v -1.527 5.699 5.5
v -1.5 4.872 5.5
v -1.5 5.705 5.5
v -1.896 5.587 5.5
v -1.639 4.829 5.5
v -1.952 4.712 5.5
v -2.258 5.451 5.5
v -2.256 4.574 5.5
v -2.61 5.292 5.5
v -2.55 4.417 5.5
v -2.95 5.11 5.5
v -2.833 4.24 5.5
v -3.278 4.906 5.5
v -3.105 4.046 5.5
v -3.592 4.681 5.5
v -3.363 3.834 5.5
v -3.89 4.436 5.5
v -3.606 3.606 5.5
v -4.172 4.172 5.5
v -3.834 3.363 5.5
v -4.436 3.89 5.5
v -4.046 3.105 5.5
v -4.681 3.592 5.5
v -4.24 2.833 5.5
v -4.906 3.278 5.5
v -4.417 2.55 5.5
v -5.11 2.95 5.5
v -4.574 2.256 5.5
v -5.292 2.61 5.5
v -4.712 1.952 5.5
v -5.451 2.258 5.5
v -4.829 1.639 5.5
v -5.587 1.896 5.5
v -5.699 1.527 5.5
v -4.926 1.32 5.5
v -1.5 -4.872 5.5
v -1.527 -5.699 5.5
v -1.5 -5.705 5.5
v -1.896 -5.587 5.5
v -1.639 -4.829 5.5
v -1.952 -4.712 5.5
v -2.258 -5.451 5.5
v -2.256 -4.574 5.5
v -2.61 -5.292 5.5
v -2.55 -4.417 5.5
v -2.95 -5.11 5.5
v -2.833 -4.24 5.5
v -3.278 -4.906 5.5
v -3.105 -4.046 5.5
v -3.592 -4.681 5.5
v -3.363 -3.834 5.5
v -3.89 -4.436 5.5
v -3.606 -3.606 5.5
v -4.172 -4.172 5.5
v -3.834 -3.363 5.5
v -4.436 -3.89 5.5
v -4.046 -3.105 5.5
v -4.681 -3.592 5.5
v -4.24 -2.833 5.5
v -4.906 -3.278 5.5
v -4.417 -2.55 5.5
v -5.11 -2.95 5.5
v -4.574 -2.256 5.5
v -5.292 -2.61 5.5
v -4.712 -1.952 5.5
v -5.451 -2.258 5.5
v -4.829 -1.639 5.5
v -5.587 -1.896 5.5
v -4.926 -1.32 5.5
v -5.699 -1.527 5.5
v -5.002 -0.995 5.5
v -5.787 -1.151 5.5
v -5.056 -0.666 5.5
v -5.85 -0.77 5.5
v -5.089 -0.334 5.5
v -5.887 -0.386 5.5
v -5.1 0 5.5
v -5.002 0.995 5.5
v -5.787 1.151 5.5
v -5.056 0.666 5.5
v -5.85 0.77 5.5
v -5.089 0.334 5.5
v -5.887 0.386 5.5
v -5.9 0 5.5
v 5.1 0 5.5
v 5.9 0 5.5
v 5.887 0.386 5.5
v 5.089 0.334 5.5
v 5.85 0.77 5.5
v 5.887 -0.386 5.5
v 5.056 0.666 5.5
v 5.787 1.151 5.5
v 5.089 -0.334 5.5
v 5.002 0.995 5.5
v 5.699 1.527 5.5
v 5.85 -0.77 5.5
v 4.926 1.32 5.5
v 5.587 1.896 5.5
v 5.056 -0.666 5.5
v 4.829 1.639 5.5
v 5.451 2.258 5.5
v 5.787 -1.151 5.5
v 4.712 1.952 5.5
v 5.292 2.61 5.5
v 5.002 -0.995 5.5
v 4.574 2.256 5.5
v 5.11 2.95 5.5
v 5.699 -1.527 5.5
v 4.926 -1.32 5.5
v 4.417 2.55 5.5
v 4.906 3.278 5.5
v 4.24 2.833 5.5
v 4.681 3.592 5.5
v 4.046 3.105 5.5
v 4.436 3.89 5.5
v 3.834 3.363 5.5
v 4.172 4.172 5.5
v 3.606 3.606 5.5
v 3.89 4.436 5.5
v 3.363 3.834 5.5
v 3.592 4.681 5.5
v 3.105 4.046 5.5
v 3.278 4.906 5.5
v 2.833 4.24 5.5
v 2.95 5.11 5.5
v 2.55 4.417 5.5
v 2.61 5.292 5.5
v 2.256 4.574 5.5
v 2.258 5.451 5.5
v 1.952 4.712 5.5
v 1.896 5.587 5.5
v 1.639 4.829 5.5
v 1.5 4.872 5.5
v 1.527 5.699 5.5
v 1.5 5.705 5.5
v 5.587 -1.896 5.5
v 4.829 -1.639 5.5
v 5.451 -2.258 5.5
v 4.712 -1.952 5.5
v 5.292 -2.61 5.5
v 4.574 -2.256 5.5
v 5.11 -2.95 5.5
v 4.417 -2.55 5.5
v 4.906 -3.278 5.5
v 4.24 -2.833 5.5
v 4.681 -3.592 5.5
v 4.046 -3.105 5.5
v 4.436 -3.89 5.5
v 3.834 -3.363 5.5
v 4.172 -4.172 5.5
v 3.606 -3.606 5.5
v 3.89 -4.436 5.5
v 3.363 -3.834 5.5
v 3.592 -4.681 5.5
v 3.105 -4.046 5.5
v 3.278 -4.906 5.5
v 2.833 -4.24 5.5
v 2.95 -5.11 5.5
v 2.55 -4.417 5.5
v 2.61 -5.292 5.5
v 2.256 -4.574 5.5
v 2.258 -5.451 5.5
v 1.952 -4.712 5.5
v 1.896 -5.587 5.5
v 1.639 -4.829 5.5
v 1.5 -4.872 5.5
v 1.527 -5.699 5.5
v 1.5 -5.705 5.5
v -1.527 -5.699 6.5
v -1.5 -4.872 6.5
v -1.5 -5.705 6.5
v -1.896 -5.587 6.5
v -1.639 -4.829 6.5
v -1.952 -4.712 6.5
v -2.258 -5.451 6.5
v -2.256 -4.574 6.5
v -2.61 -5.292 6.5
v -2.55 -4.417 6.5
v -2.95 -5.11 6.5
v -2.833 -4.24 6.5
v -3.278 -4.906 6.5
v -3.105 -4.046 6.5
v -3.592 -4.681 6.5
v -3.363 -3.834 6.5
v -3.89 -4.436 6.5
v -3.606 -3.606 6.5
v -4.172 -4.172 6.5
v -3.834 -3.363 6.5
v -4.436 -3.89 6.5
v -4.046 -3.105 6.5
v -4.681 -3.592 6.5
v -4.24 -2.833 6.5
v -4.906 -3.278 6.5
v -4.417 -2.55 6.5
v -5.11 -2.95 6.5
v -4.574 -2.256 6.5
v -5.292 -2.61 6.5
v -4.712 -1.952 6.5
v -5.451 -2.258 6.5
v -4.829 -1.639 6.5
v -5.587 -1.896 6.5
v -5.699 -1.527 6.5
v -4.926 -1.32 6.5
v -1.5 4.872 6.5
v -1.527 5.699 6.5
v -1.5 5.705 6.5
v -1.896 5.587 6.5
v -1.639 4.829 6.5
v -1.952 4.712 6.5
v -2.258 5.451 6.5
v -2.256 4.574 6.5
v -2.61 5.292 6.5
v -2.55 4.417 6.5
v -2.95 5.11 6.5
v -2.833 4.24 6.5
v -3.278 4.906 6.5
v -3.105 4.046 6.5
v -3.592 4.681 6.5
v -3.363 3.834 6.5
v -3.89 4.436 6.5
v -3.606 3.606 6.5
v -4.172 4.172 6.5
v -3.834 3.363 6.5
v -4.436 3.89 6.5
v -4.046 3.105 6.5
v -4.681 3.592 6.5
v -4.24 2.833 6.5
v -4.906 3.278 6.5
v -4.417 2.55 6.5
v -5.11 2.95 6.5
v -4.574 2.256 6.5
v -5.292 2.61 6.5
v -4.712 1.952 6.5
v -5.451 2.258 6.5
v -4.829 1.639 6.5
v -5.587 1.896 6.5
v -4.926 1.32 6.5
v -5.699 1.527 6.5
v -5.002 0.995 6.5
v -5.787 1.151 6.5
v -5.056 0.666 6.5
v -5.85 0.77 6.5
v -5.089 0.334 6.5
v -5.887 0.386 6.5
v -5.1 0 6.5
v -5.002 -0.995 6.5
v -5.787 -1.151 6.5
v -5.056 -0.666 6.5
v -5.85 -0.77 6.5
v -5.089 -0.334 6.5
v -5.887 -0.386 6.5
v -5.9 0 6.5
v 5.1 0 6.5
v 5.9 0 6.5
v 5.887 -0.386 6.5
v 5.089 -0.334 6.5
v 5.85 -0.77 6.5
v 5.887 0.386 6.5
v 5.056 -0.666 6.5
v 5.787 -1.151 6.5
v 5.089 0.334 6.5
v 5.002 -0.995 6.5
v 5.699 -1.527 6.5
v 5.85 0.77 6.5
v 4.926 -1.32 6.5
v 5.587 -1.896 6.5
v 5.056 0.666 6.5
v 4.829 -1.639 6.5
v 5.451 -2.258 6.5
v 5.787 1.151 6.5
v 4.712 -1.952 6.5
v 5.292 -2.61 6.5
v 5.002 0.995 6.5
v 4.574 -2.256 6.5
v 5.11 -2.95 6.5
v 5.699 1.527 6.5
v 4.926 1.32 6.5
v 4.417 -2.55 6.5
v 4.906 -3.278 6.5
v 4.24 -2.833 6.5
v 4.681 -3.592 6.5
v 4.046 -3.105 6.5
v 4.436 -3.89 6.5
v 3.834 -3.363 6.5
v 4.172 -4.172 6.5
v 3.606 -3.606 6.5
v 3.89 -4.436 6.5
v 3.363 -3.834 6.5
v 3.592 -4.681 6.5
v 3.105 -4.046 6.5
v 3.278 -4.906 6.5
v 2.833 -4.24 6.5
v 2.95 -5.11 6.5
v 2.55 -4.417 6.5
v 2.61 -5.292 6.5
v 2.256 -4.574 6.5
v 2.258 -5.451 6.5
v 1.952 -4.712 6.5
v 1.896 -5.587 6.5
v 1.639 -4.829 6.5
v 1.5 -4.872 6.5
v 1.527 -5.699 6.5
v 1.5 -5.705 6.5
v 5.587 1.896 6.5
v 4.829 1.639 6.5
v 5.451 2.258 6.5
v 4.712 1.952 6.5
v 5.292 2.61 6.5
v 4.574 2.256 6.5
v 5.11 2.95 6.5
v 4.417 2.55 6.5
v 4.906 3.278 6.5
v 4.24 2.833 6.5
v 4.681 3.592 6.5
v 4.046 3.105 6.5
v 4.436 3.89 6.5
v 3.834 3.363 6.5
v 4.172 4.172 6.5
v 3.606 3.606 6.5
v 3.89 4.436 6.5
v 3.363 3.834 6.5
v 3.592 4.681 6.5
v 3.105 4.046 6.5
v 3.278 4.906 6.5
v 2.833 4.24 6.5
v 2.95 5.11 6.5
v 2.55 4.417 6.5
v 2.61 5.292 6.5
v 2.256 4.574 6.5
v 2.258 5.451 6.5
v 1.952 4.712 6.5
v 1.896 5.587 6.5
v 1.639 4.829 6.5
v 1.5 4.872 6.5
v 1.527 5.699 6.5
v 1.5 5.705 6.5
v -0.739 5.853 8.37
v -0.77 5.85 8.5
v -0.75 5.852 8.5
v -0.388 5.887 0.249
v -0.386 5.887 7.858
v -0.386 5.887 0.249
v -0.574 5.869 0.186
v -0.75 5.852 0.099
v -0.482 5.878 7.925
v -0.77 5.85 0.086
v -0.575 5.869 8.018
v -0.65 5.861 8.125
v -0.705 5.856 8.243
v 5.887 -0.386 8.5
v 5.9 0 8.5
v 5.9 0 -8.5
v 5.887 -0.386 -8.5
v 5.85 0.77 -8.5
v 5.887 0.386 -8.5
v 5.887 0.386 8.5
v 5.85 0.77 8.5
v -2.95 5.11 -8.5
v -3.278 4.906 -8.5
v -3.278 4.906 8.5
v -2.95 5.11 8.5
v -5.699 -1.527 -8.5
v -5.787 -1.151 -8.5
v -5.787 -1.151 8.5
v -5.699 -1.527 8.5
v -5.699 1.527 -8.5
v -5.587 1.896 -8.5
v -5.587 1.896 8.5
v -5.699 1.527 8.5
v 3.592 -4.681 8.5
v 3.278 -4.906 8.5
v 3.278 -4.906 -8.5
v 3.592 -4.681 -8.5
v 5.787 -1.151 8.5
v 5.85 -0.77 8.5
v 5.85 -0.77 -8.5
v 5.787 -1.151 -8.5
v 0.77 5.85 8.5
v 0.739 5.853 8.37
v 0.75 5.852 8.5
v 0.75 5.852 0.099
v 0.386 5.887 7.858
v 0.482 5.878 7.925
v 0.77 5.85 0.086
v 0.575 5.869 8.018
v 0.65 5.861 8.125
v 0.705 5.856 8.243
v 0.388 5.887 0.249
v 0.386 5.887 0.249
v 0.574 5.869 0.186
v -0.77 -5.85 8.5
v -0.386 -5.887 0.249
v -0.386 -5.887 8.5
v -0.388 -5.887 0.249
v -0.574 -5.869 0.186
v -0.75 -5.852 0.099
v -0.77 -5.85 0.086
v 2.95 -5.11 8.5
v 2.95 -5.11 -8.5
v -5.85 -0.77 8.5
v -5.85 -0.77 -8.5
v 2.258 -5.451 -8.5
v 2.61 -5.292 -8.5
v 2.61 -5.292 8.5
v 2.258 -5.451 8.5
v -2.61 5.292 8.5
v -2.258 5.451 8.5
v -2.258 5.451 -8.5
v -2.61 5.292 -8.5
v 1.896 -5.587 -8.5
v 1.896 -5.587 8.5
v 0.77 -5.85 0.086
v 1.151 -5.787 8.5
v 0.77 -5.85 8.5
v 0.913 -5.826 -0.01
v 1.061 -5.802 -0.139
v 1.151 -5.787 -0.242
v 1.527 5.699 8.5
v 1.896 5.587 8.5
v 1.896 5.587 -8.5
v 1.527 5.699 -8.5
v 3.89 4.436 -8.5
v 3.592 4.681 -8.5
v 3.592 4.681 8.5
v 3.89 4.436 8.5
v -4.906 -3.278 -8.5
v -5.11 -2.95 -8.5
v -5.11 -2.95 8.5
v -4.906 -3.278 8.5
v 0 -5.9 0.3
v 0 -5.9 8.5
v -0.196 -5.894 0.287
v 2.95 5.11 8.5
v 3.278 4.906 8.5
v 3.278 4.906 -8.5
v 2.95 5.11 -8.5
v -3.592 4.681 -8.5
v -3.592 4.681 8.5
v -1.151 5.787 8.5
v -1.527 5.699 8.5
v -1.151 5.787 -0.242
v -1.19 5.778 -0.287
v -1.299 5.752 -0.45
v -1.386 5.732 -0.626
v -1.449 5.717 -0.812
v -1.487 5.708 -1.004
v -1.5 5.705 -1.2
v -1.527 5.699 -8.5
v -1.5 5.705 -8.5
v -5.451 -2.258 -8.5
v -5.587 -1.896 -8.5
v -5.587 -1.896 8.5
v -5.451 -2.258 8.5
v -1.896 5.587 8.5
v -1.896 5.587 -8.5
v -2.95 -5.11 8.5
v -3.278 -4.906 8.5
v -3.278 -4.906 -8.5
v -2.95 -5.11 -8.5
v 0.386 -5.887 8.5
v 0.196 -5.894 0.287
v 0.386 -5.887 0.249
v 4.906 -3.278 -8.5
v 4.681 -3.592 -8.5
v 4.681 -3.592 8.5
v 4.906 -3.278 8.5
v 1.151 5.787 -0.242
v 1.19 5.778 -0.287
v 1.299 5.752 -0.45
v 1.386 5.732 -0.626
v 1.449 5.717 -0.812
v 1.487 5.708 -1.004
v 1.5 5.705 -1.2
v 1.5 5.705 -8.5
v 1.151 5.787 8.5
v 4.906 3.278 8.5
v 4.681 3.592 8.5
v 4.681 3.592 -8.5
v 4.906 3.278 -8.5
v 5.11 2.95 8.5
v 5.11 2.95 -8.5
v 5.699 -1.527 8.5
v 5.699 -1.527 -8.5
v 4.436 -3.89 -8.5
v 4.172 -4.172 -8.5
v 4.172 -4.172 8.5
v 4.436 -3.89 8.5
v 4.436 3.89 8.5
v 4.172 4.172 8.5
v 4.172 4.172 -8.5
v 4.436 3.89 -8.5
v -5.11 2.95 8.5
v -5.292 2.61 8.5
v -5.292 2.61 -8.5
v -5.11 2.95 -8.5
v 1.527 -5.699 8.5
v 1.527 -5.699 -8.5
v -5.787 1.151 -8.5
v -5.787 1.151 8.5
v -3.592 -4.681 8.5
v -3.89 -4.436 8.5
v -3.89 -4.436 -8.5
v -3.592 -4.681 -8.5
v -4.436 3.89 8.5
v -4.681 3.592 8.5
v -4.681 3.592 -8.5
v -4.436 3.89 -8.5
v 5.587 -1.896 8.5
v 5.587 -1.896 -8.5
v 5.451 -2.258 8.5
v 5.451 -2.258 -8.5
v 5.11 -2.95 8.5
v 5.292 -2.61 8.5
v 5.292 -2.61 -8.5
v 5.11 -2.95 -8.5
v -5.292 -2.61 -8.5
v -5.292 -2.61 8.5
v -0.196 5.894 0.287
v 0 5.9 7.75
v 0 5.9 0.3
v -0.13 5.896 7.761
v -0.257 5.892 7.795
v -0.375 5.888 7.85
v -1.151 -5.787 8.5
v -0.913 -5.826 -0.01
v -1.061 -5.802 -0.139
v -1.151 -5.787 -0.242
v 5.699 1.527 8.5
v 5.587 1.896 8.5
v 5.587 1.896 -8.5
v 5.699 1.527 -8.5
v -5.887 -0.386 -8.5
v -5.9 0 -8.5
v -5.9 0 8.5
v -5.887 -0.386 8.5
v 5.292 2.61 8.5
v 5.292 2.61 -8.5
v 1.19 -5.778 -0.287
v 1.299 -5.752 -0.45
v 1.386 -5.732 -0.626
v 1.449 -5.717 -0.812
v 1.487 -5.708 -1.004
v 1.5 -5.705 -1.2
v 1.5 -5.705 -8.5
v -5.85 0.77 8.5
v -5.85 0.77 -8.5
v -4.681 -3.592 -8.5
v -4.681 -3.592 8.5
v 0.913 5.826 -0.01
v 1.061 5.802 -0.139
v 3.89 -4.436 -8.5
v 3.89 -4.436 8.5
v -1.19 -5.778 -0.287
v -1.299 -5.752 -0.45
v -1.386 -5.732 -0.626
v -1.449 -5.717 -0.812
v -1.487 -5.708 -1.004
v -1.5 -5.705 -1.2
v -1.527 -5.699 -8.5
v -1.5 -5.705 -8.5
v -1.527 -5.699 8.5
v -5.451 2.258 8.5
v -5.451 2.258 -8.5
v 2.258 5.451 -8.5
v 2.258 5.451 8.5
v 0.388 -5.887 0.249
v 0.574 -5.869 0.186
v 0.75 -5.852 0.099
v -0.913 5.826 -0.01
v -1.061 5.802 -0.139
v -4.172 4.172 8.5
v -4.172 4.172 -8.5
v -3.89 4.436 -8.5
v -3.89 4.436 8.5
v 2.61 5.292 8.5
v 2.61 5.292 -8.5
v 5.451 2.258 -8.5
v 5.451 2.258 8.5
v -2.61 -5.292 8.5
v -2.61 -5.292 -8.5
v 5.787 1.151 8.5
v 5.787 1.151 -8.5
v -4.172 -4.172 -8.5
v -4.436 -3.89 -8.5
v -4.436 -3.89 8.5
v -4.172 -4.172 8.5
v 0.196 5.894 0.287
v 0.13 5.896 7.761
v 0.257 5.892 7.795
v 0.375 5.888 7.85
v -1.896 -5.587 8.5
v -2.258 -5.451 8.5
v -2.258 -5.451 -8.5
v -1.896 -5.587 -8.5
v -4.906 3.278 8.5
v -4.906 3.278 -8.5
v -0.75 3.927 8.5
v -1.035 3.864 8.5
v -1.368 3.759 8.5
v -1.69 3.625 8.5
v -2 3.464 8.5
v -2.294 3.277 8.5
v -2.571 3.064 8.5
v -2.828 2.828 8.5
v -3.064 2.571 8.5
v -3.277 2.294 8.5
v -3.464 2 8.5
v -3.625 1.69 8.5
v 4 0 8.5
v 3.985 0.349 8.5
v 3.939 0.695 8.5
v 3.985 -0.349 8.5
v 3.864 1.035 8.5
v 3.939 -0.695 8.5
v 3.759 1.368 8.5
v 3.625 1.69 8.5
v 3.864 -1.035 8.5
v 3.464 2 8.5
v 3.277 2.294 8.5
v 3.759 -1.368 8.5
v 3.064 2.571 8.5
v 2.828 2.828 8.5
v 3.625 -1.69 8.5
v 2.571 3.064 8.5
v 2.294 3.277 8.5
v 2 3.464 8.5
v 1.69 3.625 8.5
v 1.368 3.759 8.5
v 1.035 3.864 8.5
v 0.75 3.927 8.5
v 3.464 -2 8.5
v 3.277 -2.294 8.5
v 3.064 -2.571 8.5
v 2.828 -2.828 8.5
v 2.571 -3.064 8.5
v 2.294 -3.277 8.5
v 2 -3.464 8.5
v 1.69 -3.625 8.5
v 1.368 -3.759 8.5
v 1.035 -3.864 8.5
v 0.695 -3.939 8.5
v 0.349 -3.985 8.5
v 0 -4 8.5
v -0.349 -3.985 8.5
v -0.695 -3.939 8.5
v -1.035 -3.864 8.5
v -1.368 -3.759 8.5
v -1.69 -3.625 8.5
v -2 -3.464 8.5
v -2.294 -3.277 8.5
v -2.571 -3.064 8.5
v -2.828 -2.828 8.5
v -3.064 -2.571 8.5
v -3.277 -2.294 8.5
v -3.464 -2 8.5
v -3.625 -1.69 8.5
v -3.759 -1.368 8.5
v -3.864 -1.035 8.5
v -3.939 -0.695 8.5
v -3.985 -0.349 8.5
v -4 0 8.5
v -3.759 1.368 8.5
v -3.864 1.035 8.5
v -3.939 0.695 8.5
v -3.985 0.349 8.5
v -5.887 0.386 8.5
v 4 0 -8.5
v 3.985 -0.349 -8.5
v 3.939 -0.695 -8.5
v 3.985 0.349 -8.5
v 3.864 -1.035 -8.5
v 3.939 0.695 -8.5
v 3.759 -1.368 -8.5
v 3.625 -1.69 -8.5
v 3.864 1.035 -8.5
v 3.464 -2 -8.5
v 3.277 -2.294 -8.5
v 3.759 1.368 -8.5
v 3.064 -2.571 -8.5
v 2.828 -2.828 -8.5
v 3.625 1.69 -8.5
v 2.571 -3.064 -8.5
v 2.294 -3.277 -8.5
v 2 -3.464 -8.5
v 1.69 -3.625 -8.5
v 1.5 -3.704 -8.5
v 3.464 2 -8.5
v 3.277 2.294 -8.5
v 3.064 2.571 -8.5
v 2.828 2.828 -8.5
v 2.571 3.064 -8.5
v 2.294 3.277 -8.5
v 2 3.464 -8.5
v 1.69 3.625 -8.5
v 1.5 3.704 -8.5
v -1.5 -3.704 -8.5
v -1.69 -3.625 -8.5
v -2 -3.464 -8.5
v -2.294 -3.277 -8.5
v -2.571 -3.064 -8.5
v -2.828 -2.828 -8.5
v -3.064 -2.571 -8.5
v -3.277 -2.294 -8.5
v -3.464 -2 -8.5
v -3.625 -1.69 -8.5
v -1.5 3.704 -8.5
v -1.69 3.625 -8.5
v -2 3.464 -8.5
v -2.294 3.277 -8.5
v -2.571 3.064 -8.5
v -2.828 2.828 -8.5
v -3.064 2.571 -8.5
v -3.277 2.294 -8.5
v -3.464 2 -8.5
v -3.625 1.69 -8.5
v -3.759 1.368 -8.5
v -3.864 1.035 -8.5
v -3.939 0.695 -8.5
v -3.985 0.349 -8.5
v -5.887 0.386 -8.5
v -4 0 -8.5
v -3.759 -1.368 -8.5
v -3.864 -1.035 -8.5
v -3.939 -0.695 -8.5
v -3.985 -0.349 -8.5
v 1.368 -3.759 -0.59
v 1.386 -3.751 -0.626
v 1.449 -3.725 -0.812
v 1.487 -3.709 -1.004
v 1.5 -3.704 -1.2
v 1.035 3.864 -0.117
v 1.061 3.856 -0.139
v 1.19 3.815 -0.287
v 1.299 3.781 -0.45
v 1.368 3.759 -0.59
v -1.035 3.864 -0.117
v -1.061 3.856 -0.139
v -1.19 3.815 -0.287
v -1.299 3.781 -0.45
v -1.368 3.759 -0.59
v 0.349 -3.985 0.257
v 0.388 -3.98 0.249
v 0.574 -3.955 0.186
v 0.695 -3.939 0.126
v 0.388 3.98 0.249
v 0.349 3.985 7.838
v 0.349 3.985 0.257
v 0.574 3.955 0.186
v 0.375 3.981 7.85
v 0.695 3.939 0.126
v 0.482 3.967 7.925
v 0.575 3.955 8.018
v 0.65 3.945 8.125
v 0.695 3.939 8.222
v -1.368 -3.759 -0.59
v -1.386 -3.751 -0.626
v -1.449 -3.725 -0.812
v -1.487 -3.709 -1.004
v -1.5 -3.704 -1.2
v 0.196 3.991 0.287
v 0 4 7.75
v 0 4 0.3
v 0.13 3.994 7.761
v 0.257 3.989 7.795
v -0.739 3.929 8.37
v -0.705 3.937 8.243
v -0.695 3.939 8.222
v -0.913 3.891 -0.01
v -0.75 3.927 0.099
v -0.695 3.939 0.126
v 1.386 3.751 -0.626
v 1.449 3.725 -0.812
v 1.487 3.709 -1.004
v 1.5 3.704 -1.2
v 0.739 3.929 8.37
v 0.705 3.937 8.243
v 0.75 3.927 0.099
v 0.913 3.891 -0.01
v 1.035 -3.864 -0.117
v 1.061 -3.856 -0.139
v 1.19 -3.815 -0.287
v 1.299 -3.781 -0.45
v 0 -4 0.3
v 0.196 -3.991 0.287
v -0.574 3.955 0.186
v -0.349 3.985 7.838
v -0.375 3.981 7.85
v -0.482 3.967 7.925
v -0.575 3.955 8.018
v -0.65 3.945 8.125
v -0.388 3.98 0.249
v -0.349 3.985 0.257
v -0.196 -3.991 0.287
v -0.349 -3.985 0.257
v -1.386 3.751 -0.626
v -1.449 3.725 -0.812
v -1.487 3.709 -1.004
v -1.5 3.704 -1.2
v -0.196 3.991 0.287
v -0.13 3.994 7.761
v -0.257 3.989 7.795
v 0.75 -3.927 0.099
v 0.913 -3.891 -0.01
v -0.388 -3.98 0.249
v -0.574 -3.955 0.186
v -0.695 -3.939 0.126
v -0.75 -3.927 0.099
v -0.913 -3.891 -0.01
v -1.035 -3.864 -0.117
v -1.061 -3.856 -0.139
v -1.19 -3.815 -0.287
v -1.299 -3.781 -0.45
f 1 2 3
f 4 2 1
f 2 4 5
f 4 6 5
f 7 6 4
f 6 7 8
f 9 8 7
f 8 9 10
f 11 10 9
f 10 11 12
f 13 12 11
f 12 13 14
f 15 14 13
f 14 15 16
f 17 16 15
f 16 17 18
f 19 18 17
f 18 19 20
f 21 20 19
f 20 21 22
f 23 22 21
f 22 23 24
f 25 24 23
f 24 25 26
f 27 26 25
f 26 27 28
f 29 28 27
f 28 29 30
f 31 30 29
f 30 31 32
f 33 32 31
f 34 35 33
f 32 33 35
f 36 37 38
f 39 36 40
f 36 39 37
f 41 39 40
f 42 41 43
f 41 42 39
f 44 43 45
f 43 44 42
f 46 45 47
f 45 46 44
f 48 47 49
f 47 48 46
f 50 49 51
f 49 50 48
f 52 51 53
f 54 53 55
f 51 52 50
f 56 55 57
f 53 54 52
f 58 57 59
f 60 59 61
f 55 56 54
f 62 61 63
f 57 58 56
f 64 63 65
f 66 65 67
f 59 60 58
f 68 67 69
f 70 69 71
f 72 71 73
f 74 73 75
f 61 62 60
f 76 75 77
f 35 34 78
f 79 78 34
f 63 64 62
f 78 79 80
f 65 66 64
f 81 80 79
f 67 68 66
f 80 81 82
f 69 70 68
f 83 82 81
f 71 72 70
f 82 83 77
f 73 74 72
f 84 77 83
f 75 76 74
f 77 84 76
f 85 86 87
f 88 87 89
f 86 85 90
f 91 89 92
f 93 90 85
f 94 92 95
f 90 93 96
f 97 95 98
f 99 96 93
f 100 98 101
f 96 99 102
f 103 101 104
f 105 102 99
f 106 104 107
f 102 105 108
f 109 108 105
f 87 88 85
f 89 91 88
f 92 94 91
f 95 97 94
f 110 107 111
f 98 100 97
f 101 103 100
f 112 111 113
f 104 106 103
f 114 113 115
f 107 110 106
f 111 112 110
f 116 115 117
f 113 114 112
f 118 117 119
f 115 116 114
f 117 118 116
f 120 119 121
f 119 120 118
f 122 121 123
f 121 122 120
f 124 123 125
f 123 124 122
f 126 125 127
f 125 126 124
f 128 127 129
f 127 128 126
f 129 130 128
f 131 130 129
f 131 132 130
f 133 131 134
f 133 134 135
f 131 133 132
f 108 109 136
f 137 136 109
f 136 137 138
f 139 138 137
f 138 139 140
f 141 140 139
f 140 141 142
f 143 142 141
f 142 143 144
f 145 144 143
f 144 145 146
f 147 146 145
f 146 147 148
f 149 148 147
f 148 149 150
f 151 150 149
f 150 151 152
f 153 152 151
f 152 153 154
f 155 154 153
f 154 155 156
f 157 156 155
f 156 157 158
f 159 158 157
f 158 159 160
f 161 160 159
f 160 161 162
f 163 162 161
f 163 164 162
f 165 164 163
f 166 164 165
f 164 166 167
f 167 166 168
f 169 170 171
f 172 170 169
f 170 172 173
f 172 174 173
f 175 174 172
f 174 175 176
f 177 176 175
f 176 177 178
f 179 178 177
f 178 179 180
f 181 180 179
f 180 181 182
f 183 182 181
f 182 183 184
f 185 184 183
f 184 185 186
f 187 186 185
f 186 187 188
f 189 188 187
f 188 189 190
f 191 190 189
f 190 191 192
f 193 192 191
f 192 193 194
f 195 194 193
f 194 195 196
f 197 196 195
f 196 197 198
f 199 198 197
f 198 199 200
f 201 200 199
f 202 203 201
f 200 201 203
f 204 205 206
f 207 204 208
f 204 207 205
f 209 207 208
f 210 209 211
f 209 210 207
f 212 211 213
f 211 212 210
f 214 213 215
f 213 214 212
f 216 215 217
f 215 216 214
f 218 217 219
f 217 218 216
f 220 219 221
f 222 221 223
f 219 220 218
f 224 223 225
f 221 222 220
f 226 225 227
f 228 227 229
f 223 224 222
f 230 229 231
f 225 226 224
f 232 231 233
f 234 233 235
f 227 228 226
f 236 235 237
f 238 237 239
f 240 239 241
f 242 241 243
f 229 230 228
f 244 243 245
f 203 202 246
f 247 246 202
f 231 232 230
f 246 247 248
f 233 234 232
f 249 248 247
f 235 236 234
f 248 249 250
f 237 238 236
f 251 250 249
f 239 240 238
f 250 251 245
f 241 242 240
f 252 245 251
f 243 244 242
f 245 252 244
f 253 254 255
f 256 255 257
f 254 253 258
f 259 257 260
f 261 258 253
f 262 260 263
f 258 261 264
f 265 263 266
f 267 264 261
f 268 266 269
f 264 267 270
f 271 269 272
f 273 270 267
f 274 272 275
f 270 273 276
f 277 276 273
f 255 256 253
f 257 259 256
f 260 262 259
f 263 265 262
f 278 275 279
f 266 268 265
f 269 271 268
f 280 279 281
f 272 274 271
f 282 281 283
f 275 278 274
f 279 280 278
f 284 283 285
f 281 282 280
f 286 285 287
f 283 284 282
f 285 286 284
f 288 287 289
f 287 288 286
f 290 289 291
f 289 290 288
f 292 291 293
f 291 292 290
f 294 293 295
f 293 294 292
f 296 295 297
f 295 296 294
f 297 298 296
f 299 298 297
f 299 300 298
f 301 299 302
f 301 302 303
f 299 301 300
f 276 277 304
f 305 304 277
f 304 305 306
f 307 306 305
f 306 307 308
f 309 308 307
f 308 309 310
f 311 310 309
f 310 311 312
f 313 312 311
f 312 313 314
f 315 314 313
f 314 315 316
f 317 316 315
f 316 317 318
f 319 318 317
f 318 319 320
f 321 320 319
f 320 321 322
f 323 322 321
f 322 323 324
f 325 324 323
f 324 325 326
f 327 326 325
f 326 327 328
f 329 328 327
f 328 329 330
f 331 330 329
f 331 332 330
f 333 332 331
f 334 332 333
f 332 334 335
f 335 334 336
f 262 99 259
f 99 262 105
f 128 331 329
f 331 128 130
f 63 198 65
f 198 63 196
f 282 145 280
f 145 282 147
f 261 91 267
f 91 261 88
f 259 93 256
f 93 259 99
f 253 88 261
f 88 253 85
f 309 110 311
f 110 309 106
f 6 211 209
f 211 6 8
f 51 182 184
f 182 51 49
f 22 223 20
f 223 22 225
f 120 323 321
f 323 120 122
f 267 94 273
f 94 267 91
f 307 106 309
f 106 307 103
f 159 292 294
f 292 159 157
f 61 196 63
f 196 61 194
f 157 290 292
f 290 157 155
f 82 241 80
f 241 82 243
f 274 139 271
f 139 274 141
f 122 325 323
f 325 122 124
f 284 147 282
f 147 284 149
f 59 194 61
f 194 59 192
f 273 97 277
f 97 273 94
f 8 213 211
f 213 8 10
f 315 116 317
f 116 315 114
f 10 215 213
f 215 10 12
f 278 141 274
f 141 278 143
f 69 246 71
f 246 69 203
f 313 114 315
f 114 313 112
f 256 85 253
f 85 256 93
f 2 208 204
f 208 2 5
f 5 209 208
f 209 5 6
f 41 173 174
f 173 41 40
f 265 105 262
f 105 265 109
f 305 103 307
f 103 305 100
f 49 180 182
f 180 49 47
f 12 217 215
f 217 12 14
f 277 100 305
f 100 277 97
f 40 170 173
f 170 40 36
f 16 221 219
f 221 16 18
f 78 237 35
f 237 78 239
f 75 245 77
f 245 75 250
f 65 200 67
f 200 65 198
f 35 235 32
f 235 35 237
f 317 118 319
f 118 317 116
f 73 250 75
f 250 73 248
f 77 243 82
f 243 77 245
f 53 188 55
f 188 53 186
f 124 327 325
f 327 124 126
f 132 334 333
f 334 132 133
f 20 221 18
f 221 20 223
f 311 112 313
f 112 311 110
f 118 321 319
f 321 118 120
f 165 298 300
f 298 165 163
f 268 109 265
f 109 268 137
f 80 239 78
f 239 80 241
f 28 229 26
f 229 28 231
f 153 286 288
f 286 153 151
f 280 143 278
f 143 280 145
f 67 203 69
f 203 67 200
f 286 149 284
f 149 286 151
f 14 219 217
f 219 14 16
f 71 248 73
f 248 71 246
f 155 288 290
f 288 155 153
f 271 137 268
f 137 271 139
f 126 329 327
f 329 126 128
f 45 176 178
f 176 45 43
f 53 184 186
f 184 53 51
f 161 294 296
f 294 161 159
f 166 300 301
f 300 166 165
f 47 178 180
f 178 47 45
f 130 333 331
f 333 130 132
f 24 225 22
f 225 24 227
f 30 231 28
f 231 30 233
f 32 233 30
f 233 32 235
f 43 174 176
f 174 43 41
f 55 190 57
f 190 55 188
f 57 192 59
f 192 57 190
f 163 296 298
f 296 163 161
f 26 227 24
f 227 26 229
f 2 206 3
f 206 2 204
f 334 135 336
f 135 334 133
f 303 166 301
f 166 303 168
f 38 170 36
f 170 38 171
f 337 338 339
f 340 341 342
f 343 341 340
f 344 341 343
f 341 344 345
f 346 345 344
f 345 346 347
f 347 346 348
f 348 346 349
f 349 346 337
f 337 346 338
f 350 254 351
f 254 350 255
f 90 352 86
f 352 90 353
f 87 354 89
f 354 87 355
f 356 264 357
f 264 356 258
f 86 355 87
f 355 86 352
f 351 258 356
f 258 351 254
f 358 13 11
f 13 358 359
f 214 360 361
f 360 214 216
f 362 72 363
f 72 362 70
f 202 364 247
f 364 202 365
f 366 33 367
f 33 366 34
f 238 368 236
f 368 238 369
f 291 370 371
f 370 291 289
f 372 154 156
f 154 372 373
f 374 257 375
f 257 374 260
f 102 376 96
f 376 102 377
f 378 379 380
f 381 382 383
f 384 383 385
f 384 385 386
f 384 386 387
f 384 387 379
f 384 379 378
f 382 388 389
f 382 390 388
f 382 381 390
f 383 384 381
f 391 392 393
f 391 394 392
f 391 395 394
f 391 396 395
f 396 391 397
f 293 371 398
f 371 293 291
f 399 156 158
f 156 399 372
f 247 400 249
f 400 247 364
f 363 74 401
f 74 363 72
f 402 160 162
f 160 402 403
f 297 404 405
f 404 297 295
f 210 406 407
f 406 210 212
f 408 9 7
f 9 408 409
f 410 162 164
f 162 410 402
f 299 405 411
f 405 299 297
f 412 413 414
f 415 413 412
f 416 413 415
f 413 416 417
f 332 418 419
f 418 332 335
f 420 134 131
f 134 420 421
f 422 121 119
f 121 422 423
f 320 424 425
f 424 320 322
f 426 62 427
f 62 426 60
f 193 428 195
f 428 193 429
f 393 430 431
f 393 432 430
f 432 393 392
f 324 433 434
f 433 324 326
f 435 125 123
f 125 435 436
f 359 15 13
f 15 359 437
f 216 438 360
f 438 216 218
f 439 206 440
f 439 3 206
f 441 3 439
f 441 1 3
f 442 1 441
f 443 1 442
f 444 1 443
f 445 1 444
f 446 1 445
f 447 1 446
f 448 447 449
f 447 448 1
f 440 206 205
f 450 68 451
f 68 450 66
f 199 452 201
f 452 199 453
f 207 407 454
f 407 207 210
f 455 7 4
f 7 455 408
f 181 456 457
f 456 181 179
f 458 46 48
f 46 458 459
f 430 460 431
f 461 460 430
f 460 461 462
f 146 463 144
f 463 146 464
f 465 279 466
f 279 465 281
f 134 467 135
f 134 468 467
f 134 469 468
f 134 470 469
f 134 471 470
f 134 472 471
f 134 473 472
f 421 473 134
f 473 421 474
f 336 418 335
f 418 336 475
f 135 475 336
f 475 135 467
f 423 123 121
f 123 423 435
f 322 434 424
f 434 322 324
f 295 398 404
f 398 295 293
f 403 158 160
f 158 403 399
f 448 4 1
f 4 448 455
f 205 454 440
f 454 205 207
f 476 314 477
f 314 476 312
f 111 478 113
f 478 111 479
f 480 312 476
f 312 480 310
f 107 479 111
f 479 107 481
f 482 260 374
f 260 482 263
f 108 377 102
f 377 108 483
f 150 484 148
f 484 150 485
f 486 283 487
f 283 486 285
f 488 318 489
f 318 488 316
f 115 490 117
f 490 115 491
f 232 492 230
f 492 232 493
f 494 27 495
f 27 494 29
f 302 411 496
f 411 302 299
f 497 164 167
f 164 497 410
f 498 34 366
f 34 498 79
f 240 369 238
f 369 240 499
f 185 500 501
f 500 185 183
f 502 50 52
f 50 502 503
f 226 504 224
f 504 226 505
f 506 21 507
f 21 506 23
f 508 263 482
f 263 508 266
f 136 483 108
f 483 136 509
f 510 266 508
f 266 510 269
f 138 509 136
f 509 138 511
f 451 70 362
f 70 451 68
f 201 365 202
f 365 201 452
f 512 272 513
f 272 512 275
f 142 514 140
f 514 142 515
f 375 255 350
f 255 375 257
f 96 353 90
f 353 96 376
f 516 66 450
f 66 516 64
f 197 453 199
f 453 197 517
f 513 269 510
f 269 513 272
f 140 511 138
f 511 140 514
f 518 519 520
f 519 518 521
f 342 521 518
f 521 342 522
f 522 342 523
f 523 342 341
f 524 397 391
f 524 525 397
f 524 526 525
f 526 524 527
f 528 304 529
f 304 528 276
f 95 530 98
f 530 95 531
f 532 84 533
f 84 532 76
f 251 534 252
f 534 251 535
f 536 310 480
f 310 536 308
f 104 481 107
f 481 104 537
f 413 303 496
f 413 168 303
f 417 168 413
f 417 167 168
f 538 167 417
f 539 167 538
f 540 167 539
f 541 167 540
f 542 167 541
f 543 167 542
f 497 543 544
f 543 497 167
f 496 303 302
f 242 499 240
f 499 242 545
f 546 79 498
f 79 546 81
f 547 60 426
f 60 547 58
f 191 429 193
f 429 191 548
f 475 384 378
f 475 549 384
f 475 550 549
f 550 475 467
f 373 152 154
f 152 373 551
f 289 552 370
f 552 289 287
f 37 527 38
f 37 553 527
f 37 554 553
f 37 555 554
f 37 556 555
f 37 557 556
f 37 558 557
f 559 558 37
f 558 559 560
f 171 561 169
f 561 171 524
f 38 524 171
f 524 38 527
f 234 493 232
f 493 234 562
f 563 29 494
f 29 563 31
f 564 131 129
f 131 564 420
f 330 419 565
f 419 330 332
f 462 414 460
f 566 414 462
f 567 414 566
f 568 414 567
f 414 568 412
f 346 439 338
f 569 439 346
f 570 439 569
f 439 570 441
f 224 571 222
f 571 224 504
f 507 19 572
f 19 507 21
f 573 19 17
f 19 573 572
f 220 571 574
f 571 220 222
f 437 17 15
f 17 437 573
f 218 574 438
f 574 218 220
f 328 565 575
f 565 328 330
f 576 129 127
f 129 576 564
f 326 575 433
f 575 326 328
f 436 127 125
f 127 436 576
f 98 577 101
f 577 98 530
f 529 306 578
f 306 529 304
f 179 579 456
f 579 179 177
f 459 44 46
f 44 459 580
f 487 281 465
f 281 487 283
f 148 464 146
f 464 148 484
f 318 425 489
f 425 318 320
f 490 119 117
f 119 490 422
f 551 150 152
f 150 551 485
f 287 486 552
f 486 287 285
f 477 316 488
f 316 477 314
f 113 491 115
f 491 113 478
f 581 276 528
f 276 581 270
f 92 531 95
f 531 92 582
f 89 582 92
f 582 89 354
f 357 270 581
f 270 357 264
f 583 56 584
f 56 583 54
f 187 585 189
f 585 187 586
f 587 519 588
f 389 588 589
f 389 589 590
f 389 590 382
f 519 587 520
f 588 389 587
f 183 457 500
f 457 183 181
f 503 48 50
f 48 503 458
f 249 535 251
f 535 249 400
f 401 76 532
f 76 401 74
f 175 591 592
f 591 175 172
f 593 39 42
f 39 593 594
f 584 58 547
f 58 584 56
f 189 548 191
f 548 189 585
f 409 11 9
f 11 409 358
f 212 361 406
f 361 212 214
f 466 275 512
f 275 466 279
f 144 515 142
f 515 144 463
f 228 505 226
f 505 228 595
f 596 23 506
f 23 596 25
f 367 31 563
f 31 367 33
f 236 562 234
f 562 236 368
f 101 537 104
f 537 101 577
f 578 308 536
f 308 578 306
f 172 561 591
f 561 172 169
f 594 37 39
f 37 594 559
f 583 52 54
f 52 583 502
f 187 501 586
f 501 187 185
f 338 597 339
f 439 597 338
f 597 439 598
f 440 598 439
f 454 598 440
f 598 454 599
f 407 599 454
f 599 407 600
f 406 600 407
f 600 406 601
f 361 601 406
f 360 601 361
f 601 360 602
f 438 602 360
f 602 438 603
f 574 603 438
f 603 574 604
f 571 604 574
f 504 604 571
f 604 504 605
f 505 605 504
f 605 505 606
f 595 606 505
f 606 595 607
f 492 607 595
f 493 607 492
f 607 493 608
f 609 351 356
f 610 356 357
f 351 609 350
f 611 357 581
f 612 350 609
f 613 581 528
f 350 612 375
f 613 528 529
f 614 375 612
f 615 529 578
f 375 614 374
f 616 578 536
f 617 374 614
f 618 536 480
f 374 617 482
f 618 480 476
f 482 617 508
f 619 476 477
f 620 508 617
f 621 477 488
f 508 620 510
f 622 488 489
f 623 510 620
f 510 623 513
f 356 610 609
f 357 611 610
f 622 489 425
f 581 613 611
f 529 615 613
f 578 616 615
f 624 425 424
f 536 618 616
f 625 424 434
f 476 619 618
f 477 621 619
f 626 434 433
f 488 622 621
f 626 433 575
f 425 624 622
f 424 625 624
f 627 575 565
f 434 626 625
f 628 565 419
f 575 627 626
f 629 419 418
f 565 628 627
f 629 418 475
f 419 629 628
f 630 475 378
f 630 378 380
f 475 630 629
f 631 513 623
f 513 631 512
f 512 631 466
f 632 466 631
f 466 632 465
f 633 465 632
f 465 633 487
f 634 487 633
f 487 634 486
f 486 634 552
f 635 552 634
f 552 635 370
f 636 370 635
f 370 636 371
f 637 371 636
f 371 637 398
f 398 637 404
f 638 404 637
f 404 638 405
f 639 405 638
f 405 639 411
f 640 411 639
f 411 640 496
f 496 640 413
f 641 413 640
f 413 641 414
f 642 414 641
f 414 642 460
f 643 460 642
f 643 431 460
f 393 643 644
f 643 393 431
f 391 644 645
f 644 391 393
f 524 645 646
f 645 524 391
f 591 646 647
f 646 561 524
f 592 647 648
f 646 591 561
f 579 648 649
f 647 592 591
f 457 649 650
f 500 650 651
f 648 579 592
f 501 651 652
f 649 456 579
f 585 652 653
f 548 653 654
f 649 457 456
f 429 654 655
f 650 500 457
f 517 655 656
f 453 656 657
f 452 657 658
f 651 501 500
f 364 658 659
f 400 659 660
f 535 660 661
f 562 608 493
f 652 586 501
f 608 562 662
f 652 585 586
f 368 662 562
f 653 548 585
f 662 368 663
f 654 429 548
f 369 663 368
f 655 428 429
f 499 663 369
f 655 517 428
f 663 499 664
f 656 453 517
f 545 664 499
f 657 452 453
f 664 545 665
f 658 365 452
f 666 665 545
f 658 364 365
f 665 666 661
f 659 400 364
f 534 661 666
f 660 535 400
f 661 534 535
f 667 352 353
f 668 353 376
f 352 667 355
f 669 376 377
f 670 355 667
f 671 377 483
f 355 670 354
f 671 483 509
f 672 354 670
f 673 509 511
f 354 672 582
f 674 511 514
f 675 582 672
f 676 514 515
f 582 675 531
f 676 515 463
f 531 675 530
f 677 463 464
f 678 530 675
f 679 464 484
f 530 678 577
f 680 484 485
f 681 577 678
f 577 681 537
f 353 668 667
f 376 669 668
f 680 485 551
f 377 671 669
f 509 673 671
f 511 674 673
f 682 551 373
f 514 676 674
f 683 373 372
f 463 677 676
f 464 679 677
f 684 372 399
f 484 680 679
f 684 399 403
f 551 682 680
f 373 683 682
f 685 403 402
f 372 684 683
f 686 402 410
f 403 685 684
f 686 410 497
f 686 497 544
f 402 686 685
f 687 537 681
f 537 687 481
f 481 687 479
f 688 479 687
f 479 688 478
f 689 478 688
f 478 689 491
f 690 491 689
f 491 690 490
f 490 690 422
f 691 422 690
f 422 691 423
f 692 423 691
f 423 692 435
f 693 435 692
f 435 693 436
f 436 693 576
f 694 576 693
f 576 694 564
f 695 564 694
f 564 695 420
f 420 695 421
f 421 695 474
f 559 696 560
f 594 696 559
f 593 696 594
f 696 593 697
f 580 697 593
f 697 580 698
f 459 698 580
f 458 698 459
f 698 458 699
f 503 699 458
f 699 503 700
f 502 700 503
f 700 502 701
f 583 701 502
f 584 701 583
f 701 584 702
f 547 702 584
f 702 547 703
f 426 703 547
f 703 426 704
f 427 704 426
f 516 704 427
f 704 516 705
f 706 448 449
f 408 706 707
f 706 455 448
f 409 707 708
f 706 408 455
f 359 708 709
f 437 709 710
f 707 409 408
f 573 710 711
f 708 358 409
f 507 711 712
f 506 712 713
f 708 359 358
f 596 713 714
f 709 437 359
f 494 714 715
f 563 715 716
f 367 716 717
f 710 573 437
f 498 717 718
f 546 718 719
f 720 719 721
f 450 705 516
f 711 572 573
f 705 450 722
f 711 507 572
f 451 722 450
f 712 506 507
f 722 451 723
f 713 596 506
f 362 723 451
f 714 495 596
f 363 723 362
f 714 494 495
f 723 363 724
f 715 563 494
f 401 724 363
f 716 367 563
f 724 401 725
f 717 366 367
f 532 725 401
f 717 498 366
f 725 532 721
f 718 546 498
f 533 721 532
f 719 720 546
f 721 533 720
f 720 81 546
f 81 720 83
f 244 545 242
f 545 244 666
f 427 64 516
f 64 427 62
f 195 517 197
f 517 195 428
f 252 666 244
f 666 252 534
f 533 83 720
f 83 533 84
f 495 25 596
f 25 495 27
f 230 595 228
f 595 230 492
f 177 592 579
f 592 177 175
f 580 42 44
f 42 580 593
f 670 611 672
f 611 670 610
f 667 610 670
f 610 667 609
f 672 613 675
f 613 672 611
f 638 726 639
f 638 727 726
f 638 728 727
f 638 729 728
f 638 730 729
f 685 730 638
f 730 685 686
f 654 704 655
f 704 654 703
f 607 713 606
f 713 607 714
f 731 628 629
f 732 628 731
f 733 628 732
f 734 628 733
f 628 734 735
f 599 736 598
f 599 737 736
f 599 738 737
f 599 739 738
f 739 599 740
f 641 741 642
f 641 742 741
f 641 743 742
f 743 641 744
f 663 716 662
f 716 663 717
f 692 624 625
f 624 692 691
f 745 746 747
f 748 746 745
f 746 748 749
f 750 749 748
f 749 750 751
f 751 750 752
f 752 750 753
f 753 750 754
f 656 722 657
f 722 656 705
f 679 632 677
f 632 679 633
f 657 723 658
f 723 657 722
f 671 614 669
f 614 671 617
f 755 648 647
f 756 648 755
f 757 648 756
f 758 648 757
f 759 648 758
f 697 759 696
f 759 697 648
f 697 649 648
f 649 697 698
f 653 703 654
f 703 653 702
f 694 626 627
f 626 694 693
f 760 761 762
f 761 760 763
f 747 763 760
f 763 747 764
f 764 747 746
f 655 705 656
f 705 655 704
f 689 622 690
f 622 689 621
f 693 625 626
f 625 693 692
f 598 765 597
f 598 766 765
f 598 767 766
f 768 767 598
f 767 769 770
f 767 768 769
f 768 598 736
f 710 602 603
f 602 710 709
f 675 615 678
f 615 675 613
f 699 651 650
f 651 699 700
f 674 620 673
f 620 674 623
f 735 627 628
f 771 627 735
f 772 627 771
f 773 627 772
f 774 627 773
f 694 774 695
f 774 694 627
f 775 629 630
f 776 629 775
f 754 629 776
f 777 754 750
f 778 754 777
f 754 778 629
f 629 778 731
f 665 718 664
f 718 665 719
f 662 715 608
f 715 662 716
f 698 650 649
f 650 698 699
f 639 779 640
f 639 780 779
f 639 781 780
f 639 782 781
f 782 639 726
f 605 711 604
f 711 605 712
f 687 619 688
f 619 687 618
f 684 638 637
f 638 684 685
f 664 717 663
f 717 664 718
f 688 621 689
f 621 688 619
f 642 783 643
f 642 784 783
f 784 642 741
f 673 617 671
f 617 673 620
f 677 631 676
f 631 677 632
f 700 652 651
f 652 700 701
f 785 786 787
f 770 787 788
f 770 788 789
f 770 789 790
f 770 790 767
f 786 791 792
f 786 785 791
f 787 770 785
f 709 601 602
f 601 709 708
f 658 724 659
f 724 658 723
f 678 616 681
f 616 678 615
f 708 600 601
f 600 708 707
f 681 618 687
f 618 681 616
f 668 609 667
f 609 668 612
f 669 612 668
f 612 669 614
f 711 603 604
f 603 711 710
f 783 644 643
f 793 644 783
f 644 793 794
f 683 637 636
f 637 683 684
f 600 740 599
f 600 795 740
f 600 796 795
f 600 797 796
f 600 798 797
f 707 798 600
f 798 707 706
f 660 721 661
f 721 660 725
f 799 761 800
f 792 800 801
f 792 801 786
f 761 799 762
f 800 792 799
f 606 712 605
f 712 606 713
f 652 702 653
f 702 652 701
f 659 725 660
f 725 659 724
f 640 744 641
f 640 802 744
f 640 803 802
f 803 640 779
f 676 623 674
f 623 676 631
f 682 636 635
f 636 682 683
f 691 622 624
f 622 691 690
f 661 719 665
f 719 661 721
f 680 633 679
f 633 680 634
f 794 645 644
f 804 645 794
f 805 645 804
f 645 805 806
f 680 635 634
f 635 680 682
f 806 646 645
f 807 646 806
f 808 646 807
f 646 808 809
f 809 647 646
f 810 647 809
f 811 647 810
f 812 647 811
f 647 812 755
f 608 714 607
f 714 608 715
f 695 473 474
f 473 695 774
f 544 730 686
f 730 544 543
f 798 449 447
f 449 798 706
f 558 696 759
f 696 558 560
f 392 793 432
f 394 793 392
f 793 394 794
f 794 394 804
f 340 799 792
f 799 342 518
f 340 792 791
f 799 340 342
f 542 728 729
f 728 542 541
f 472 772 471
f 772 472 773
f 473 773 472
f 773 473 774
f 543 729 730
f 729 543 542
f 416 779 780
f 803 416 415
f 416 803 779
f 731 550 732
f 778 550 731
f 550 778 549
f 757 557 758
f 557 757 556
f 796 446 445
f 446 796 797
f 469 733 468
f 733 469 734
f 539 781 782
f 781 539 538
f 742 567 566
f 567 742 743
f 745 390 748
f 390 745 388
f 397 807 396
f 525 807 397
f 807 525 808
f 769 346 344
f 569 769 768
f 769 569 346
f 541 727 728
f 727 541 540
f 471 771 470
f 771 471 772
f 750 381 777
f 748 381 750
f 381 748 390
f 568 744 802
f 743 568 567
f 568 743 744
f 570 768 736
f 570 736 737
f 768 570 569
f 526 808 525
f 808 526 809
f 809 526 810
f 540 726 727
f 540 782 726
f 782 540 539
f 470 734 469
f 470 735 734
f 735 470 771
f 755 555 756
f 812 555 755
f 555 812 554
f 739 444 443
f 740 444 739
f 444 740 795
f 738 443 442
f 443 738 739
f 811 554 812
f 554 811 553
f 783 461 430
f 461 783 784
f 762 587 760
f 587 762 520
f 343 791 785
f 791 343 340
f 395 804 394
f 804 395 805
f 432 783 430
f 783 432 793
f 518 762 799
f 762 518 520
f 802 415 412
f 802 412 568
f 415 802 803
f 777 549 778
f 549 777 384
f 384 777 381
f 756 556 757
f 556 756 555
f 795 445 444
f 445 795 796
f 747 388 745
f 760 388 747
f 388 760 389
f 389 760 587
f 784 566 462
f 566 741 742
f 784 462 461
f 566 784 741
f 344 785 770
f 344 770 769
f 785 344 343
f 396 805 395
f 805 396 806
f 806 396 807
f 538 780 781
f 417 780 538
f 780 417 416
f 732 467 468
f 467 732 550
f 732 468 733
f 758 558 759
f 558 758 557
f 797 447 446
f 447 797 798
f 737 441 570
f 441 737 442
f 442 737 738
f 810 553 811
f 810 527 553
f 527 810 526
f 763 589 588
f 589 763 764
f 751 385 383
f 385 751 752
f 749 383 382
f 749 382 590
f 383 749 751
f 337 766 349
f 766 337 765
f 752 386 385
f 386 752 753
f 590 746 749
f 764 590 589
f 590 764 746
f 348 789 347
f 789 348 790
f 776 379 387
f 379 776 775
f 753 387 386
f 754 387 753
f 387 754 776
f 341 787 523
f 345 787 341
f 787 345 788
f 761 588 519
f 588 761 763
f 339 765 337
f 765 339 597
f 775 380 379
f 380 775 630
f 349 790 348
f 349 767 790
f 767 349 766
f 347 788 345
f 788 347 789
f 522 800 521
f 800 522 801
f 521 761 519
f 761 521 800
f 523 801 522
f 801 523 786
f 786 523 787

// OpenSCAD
// Part A6: slotted bush with top band cut.
// SPDX-License-Identifier: MIT
//
// Local origin convention:
// - XY origin is the tube axis.
// - Z origin is the part midplane.
// - Assembly placement and animation should be applied outside this file.

module part_a6(
    od = 11.8,
    id = 8.0,
    h = 17.0,
    // Top band zone (from side view: 2.0 down, 1.0 tall).
    top_band_offset = 2.0,
    top_band_h = 1.0,
    top_band_depth = 0.8,
    // Lower U slot (front view).
    u_slot_w = 3.0,
    u_slot_h = 8.8,
    // Small top notch callout (Ø1.5 centered at top edge -> half-circle depression).
    top_hole_d = 1.5,
    top_hole_z = 17.0,
    // Top band cut with two opposite remaining tabs (opposite sides).
    top_tab_w = 3.0,
    top_slot_h = 1.0
) {
    u_slot_r = u_slot_w / 2;
    // Height where rounded cap of the U-slot starts.
    u_slot_rect_h = max(0, u_slot_h - u_slot_r);
    z_min = -h / 2;
    band_z = z_min + h - top_band_offset - top_band_h;

    difference() {
        // Main tube body.
        translate([0, 0, z_min])
            cylinder(d = od, h = h, center = false, $fn = 96);

        // Through inner bore (R4.0 / Ø8.0).
        translate([0, 0, z_min - 0.1]) cylinder(d = id, h = h + 0.2, center = false, $fn = 72);

        // Inverted interpretation: cut most of the top band annulus,
        // leaving two opposite tabs centered at 0/180 degrees.
        translate([0, 0, band_z])
            difference() {
                difference() {
                    cylinder(d = od + 0.2, h = top_slot_h, center = false, $fn = 96);
                    cylinder(d = od - 2 * top_band_depth, h = top_slot_h + 0.02, center = false, $fn = 96);
                }
                for (a = [90, 270])
                    rotate([0, 0, a])
                        translate([od / 2 - top_band_depth / 2, 0, top_slot_h / 2])
                            cube([top_band_depth + 0.6, top_tab_w, top_slot_h + 0.2], center = true);
            }

        // Bottom U-slot, open from one side (front view behavior).
        // Build from a rectangular stem plus rounded cap.
        translate([-u_slot_w / 2, -od / 2 - 0.1, z_min])
            cube([u_slot_w, od + 0.2, u_slot_rect_h], center = false);
        translate([0, 0, z_min + u_slot_rect_h])
            rotate([90, 0, 0])
                cylinder(r = u_slot_r, h = od + 0.2, center = true, $fn = 48);

        // Small top detent/hole (Ø1.5), fully through one side wall into the bore.
        wall_t = (od - id) / 2;
        translate([0, od / 2 + 0.05, z_min + top_hole_z])
            rotate([90, 0, 0])
                cylinder(d = top_hole_d, h = wall_t + 0.2, center = false, $fn = 36);
    }
}


// ---- "main guard" ----
// Default to previewing when opened directly:
if (is_undef(__LIB_MODE__)) {
    part_a6();
}
